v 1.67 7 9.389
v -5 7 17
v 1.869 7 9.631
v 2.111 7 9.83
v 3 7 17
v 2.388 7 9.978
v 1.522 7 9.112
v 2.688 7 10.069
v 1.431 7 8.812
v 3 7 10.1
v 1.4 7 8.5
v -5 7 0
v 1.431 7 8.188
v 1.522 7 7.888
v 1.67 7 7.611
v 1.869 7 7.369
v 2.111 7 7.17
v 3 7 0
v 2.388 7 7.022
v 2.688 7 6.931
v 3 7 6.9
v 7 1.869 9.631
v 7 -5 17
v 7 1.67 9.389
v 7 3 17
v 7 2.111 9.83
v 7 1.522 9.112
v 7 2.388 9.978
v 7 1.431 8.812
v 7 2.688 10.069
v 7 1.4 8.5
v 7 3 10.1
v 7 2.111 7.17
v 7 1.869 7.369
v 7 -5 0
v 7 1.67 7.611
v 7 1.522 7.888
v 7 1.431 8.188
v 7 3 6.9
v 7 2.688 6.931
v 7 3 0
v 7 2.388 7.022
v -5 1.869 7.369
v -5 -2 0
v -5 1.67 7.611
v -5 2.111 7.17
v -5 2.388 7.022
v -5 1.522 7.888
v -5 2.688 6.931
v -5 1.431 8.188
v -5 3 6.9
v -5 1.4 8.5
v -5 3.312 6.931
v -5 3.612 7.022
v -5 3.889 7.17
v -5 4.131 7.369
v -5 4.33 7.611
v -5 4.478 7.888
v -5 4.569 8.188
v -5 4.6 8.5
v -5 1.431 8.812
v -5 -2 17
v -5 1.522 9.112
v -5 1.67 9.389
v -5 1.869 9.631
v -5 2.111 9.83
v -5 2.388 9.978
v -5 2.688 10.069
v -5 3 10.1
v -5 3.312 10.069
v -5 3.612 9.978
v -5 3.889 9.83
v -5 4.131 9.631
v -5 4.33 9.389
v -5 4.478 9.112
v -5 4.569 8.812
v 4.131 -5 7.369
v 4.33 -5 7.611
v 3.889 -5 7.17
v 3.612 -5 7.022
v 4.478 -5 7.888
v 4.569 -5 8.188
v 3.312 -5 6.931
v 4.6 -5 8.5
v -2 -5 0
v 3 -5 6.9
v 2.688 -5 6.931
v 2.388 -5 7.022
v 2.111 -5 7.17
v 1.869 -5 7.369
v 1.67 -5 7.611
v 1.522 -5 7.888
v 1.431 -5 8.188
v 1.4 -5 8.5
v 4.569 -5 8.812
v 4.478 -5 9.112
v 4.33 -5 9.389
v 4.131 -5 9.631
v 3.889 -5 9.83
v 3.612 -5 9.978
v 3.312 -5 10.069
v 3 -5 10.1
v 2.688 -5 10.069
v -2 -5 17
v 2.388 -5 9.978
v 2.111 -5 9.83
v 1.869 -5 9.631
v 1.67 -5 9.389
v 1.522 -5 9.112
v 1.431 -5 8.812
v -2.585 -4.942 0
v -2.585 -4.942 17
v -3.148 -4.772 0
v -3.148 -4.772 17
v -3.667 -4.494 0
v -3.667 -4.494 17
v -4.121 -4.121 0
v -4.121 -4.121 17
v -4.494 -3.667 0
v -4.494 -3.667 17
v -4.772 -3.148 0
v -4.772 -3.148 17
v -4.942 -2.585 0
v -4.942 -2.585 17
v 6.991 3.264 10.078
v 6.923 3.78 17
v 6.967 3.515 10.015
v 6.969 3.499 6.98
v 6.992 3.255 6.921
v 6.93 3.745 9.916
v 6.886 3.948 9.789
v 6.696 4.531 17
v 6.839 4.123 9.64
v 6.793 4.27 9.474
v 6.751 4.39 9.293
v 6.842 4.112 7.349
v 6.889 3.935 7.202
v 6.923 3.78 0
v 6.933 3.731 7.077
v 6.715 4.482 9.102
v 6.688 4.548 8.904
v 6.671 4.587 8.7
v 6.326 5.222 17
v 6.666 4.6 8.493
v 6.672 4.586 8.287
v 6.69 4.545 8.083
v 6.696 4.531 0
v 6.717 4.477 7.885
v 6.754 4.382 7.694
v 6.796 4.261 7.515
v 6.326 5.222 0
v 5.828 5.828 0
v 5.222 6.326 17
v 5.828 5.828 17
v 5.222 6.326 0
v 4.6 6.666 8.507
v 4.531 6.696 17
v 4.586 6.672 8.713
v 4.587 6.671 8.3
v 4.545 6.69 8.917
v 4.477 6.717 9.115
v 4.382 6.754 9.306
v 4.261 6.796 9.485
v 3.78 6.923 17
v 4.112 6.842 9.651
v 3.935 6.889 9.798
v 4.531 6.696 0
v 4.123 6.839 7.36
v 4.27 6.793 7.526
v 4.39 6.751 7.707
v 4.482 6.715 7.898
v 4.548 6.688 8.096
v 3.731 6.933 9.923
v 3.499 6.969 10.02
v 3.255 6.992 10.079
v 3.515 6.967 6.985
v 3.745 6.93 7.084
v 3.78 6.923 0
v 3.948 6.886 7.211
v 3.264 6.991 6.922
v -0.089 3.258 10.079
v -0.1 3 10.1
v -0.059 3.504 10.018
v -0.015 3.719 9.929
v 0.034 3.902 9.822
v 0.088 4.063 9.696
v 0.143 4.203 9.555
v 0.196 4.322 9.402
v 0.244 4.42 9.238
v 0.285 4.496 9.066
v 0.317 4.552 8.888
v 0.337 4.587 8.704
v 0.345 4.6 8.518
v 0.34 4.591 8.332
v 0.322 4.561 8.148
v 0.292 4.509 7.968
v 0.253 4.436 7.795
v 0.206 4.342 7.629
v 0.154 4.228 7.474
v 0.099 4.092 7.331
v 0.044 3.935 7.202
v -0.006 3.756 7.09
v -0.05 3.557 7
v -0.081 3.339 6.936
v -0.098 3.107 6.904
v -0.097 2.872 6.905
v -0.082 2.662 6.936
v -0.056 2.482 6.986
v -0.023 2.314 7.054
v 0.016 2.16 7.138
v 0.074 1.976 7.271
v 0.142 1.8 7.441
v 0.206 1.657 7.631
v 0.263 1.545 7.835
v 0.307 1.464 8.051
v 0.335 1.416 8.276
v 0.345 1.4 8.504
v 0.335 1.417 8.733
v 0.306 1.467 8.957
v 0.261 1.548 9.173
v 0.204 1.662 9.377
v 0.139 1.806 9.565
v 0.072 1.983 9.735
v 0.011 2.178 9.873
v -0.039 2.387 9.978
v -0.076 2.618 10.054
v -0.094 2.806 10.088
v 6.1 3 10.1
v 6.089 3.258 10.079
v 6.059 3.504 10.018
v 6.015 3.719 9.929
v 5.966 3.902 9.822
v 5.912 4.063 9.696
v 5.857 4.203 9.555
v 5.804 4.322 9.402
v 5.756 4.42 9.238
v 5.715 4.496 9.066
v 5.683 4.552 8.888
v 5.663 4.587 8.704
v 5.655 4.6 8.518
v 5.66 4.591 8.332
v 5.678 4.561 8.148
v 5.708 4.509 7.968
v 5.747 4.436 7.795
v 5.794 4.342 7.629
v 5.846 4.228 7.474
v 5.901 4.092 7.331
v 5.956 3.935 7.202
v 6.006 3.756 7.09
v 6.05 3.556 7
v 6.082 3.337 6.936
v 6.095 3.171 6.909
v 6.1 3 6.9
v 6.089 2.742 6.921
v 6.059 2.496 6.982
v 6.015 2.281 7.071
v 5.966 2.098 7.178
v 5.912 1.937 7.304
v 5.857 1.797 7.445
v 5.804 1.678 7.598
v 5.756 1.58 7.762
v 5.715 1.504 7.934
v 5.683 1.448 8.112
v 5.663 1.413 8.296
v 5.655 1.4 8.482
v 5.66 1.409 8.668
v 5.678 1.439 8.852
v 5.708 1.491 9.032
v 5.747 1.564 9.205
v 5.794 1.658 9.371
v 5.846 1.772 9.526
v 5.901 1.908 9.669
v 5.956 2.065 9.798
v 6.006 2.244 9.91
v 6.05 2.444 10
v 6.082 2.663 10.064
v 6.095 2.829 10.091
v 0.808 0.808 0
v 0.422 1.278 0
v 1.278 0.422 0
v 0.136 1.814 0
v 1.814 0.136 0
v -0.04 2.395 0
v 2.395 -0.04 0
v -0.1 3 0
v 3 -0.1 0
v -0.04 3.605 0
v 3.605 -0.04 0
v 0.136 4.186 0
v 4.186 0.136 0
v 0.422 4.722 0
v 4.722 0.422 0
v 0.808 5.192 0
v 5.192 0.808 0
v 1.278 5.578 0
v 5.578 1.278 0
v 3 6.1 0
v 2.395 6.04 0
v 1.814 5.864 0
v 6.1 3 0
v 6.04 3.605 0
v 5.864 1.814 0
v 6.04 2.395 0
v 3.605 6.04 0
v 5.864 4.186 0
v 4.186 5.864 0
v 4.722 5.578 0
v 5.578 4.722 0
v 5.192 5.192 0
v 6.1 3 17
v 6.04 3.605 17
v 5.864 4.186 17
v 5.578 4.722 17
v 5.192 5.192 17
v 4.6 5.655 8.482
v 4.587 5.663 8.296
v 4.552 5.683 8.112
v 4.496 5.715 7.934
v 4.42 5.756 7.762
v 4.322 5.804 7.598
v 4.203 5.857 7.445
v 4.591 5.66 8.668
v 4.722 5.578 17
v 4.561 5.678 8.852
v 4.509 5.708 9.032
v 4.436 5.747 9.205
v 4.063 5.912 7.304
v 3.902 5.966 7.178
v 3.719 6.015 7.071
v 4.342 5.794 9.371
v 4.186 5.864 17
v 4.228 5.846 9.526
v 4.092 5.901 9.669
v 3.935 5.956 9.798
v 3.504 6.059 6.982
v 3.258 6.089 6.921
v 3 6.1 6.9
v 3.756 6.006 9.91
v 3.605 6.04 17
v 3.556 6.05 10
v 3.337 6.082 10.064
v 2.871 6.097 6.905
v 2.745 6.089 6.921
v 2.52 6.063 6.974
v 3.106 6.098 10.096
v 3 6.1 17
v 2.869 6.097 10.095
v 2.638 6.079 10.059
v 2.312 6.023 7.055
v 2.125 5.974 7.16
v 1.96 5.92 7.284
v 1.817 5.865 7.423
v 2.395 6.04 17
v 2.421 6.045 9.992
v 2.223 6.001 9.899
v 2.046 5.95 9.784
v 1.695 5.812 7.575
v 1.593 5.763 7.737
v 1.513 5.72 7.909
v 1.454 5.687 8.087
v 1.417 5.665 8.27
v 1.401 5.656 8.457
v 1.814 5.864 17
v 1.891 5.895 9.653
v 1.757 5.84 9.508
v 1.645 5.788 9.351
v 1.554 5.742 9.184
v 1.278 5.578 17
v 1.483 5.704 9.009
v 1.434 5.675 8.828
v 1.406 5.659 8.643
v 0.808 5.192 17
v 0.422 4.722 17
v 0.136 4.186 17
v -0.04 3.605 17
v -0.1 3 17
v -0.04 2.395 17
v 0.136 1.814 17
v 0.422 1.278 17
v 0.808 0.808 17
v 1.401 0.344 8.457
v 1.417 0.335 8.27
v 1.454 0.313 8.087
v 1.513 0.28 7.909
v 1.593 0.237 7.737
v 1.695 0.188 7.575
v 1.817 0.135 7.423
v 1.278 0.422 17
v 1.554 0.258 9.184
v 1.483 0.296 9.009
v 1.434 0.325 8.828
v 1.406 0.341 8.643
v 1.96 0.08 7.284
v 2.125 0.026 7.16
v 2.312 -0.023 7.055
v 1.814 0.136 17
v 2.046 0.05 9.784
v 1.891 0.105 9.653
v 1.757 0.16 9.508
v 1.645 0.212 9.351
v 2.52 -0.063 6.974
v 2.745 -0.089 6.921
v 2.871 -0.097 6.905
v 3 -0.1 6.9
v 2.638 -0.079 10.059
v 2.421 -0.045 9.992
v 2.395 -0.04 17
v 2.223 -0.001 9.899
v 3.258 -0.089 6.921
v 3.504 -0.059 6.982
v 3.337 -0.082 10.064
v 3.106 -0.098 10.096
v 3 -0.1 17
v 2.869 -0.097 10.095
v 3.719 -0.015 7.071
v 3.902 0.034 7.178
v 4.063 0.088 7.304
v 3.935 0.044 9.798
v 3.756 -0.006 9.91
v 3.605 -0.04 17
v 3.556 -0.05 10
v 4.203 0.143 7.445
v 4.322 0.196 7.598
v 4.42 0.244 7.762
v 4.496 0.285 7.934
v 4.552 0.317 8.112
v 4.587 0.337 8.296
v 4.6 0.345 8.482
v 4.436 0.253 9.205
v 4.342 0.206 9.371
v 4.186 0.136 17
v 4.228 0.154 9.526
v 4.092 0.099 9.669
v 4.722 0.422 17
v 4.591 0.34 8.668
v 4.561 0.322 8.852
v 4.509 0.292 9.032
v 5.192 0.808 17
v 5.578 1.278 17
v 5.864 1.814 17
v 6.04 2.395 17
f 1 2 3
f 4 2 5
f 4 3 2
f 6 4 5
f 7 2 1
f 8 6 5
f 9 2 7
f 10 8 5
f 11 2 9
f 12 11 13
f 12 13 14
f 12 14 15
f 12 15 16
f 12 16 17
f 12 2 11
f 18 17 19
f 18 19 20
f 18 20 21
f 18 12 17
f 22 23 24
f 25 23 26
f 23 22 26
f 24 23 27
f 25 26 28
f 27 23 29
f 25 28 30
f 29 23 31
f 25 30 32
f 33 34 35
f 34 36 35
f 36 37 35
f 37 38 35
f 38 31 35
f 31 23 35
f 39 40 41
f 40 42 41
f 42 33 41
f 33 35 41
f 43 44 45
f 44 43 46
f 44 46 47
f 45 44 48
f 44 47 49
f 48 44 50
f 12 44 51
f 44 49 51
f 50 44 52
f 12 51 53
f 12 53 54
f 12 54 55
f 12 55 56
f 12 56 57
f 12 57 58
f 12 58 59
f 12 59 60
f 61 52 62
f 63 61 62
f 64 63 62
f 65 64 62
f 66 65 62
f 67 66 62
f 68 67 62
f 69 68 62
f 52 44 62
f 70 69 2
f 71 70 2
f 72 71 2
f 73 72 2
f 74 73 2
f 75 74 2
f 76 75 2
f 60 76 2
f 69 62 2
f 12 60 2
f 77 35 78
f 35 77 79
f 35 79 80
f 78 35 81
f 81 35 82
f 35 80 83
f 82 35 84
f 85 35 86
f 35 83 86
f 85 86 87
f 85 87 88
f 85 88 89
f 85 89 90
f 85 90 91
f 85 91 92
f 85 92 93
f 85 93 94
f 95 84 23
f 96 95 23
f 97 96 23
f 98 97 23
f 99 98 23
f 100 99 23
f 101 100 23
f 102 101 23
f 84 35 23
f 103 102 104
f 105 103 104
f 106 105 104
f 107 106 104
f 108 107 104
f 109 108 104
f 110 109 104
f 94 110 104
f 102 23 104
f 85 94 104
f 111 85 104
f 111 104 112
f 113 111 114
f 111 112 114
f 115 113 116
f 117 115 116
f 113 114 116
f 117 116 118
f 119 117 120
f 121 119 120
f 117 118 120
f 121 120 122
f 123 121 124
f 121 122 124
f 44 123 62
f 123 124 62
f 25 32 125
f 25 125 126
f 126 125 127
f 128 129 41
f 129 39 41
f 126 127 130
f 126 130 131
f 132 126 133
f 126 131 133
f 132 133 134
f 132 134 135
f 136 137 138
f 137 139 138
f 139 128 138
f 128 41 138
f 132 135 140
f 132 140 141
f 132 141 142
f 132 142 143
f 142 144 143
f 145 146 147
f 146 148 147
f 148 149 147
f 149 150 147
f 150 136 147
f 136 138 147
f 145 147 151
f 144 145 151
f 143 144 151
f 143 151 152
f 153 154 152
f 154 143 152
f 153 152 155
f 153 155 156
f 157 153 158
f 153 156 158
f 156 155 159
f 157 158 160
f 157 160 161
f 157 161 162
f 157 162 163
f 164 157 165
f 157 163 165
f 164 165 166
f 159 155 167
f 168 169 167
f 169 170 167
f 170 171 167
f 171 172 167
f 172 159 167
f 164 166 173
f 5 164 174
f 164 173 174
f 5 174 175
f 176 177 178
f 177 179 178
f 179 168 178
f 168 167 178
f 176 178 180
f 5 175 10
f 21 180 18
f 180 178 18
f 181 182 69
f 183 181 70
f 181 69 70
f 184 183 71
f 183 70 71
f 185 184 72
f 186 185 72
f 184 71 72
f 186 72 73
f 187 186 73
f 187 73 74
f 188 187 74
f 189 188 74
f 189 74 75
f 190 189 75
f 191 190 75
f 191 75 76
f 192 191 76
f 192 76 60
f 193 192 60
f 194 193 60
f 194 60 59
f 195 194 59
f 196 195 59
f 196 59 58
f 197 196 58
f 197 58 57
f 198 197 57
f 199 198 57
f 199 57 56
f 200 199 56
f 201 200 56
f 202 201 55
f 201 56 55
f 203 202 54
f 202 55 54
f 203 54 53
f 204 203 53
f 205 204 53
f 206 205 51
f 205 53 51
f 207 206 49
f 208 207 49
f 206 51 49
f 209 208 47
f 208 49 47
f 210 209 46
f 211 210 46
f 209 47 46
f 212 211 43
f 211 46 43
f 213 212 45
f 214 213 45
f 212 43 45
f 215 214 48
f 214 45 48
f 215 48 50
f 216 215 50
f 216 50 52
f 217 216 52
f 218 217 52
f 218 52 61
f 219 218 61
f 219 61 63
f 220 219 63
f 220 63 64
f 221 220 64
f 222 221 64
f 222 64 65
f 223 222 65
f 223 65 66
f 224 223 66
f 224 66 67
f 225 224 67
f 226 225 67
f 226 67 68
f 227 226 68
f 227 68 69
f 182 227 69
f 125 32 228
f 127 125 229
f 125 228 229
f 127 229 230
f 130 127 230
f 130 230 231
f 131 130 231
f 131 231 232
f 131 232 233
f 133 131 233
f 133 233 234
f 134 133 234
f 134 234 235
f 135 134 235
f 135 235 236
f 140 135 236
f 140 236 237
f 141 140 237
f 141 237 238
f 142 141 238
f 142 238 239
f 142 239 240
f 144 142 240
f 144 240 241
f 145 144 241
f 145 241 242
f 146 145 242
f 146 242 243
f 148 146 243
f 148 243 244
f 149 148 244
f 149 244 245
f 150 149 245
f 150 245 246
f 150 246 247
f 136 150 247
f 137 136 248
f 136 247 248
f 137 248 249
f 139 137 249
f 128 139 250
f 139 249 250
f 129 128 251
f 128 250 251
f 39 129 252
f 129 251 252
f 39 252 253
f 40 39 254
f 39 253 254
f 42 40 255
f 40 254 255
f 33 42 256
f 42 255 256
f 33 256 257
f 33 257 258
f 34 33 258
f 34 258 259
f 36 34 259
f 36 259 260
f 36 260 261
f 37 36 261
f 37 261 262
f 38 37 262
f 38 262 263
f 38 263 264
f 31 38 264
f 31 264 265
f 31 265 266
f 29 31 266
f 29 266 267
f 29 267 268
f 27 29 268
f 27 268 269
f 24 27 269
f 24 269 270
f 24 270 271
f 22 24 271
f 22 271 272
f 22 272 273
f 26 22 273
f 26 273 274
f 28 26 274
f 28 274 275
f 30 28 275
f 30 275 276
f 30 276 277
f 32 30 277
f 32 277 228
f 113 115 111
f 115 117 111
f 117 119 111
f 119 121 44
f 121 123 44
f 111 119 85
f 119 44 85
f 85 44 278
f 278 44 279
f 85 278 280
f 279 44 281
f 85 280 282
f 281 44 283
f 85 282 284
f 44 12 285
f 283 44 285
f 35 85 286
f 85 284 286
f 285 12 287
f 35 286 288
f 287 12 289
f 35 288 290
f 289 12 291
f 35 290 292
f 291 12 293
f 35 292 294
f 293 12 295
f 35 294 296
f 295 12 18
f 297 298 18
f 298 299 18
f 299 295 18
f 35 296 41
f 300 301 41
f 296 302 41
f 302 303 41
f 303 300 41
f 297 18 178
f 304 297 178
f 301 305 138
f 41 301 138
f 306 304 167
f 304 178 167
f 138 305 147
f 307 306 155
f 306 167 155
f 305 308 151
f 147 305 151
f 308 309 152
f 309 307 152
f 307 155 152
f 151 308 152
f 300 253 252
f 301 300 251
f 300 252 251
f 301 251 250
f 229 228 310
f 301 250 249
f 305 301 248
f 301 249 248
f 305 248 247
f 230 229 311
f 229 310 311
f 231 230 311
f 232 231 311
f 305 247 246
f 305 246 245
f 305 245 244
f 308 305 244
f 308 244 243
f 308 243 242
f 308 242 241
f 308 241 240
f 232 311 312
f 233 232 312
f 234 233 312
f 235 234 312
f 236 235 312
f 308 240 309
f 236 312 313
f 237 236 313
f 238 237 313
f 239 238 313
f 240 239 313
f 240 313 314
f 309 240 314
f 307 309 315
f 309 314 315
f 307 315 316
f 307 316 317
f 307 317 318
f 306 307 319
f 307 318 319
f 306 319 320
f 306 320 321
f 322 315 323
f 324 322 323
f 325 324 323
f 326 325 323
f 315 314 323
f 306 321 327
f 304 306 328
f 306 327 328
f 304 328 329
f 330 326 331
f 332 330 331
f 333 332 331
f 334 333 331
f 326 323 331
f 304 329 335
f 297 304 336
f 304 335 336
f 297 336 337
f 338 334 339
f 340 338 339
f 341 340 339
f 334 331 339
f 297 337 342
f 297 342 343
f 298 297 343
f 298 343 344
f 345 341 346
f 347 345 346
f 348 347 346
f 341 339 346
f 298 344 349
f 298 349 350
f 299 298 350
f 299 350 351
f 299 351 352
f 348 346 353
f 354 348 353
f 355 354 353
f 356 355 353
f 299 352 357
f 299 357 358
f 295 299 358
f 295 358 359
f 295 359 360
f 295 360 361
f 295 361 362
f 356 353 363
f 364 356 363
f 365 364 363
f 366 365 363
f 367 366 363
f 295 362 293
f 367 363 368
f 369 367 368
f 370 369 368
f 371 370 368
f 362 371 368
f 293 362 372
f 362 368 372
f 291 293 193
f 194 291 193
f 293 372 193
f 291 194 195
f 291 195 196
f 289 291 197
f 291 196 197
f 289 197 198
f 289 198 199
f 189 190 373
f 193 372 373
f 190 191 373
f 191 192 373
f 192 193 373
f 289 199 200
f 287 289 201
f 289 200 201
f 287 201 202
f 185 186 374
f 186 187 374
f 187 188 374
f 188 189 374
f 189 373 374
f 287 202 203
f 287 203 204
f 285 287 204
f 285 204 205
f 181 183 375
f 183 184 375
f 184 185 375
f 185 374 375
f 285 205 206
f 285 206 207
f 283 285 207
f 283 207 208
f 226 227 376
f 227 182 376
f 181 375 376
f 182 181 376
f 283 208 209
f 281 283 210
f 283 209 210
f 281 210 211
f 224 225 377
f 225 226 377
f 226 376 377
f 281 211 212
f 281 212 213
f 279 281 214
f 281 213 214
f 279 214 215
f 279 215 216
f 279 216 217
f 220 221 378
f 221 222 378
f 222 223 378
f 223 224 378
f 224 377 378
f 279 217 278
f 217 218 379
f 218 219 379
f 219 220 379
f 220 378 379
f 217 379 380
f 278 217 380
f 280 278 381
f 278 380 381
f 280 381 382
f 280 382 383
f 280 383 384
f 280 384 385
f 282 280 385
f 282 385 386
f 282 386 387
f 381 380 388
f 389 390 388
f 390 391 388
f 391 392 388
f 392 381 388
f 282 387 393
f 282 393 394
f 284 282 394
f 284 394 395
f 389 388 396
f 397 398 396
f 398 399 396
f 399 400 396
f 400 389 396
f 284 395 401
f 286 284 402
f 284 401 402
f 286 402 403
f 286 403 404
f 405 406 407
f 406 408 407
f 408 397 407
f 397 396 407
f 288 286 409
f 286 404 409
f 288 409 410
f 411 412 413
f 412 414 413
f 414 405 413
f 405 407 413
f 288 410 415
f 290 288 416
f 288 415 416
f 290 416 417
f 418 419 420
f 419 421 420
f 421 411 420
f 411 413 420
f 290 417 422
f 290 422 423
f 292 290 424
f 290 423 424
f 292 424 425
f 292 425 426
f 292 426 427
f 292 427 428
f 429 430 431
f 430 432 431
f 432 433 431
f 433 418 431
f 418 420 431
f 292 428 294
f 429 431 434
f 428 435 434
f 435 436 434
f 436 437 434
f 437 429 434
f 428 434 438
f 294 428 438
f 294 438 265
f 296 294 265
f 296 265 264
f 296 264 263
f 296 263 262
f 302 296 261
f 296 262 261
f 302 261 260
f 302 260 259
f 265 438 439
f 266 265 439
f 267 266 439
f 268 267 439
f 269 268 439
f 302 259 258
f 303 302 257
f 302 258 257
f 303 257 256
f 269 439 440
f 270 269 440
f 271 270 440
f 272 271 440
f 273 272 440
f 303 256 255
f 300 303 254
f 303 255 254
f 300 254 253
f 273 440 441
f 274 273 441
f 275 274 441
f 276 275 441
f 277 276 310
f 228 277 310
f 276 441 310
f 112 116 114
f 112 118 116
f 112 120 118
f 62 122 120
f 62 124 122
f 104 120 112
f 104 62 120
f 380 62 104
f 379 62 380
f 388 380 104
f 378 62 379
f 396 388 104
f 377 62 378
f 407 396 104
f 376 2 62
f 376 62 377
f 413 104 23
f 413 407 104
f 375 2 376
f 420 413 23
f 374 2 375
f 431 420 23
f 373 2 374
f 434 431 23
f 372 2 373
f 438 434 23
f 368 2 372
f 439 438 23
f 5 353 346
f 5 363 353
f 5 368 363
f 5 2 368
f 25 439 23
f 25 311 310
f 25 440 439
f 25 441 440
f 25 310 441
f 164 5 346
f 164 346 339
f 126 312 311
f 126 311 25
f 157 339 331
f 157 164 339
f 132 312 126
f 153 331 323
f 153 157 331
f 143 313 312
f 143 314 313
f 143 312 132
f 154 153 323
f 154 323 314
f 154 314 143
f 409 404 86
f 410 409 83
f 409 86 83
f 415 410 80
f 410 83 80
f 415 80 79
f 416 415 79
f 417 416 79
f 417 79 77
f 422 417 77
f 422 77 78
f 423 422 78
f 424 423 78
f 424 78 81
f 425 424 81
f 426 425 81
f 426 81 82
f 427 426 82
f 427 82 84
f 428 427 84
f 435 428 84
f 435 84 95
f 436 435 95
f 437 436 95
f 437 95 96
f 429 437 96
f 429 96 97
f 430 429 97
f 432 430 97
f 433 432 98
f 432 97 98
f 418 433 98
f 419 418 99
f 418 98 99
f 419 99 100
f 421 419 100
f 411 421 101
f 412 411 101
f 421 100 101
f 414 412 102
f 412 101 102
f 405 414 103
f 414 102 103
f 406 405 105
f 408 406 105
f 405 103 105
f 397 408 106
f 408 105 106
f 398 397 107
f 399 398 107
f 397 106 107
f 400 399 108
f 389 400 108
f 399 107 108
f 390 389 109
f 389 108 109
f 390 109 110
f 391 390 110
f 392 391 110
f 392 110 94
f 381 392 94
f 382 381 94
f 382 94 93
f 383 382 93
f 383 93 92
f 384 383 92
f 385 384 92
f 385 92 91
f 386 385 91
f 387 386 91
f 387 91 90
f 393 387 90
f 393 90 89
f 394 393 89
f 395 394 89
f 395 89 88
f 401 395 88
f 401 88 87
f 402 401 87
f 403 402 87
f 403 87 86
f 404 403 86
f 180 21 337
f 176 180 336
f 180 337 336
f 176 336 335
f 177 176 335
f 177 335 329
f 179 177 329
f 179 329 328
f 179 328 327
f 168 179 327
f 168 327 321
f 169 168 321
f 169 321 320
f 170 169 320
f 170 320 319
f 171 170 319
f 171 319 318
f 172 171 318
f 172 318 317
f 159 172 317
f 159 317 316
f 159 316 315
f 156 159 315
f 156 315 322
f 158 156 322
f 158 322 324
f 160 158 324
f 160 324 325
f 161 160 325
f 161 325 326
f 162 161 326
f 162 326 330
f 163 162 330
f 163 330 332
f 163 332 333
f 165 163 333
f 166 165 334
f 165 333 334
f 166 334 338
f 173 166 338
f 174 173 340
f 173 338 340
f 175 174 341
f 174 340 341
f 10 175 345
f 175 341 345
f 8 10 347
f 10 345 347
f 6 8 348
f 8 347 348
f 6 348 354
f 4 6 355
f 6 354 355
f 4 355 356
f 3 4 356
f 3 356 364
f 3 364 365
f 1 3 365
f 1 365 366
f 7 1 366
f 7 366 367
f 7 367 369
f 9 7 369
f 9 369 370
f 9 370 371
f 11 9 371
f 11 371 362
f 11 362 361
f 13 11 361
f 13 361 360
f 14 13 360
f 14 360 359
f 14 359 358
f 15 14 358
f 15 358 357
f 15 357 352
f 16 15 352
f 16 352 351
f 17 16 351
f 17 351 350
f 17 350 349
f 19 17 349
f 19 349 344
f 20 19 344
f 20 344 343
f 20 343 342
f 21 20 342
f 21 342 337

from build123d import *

# Parameters (mm, degrees)
SKETCH_1_W          = 14
SKETCH_1_H          = 14
EXTRUDE_1_DEPTH     = 17
SKETCH_2_R          = 3.1
CUT_EXTRUDE_1_DEPTH = 20.672315573
FILLET_1_R          = 5
CUT_EXTRUDE_2_DEPTH = 17
SKETCH_4_R          = 1.6
CUT_EXTRUDE_3_DEPTH = 17
SKETCH_5_R          = 1.6
CUT_EXTRUDE_4_DEPTH = 17
FILLET_2_R          = 4


with BuildPart() as part:
    # ｽｹｯﾁ1 → ﾎﾞｽ - 押し出し1 (new body)
    with BuildSketch(Plane.XY):
        Rectangle(SKETCH_1_W, SKETCH_1_H)
    extrude(amount=EXTRUDE_1_DEPTH)

    # ｽｹｯﾁ2 → ｶｯﾄ - 押し出し1 (cut, through all)
    with BuildSketch(Plane.XY.offset(17)):
        with Locations((3, 3)):
            Circle(SKETCH_2_R)
    extrude(amount=-CUT_EXTRUDE_1_DEPTH, mode=Mode.SUBTRACT)

    # ﾌｨﾚｯﾄ1
    fillet_1_edges = [part.edges().sort_by_distance(p)[0] for p in [
        (-7, -7, 8.5),
    ]]
    fillet(fillet_1_edges, radius=FILLET_1_R)

    # ｽｹｯﾁ3 → ｶｯﾄ - 押し出し2 (cut)
    with BuildSketch(Plane.XY.offset(17)):
        with BuildLine():
            Line((-7, 7), (-7, -7))
            Line((-7, -7), (7, -7))
            Line((7, -7), (7, -5))
            Line((7, -5), (-2, -5))
            ThreePointArc((-2, -5), (-4.121320344, -4.121320344), (-5, -2))
            Line((-5, -2), (-5, 7))
            Line((-5, 7), (-7, 7))
        make_face()
    extrude(amount=-CUT_EXTRUDE_2_DEPTH, mode=Mode.SUBTRACT)

    # ｽｹｯﾁ4 → ｶｯﾄ - 押し出し3 (cut)
    with BuildSketch(Plane.XZ.offset(5)):
        with Locations(Location((3, 8.5, 0), (0, 0, 270))):
            Circle(SKETCH_4_R)
    extrude(amount=-CUT_EXTRUDE_3_DEPTH, mode=Mode.SUBTRACT)

    # ｽｹｯﾁ5 → ｶｯﾄ - 押し出し4 (cut)
    with BuildSketch(Plane.ZY.offset(5)):
        with Locations((8.5, 3)):
            Circle(SKETCH_5_R)
    extrude(amount=-CUT_EXTRUDE_4_DEPTH, mode=Mode.SUBTRACT)

    # ﾌｨﾚｯﾄ2
    # the kernel refuses this fillet: 4 mm, written as the material it takes off along each edge
    with BuildSketch(Plane(origin=(7, 7, -10), x_dir=(-1, 0, 0), z_dir=(0, 0, 1))) as fillet_2_piece_1:
        with BuildLine():
            CenterArc((FILLET_2_R, FILLET_2_R), FILLET_2_R, 180, 90)
            Line((0, FILLET_2_R), (0, 0))
            Line((0, 0), (FILLET_2_R, 0))
        make_face()
    extrude(amount=37, mode=Mode.SUBTRACT)


solid = part.part
